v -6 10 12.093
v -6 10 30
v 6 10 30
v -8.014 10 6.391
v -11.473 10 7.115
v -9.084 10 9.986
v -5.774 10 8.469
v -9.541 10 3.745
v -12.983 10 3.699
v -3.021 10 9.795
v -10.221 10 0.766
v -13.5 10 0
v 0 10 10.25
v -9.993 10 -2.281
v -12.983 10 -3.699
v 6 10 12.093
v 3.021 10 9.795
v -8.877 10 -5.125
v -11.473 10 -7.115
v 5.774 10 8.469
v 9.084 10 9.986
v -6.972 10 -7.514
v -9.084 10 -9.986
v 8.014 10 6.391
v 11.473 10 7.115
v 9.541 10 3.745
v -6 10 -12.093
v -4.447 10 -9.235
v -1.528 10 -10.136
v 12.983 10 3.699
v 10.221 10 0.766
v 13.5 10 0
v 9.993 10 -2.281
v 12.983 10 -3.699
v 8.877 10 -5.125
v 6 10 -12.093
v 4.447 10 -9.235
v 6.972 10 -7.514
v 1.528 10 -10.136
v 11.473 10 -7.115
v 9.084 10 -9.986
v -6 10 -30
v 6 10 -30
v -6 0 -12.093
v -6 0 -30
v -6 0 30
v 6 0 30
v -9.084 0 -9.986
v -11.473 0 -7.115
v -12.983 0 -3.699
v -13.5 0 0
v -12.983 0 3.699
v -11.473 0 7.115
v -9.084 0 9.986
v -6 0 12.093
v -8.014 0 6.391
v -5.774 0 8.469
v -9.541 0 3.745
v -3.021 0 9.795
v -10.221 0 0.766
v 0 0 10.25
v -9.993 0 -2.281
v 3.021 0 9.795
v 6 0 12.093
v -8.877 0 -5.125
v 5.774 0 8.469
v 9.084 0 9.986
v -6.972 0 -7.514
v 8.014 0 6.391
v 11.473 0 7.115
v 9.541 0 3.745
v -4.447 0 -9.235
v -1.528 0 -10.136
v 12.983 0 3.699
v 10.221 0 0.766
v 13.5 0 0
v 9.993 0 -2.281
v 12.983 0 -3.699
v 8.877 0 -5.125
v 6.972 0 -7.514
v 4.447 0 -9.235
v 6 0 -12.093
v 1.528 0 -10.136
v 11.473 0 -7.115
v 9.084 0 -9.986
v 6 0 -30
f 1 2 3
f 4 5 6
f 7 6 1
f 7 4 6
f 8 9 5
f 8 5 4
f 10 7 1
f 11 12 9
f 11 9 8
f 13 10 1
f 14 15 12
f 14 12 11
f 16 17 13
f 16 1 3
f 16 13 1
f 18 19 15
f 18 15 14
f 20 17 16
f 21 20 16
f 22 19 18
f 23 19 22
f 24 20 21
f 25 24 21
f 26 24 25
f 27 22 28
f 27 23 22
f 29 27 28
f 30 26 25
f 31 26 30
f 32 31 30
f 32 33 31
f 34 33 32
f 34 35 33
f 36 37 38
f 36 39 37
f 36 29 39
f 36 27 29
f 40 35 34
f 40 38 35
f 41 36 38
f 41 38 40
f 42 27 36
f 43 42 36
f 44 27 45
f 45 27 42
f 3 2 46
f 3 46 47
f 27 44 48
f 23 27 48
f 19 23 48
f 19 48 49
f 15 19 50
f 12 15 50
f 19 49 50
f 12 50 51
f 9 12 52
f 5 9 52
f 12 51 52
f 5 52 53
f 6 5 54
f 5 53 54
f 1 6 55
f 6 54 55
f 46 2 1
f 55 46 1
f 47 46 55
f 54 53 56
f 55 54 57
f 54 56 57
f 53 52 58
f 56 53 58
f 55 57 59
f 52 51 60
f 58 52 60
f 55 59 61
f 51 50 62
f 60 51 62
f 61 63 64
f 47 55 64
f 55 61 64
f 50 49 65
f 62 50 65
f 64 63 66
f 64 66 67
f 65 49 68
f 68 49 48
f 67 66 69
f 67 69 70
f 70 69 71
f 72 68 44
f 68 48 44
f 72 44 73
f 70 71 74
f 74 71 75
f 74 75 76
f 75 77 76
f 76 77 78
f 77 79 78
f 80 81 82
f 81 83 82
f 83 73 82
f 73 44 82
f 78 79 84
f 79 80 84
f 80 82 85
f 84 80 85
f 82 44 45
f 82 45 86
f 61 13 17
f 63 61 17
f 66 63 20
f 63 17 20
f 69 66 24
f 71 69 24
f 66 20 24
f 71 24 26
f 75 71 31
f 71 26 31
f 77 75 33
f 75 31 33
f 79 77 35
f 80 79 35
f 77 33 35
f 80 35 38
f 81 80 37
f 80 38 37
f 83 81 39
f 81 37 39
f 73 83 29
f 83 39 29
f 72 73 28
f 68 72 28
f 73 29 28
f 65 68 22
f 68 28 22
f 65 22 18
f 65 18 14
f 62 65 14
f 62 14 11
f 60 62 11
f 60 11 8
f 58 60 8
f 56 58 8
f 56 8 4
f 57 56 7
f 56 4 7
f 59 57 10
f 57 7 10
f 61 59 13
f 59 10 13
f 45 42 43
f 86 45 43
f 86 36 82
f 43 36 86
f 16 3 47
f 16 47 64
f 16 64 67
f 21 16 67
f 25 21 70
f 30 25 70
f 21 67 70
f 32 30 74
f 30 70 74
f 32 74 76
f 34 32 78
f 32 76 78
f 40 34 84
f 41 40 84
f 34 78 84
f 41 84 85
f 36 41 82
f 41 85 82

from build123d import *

# Parameters (mm, degrees)
SKETCH_1_R          = 13.5
EXTRUDE_1_DEPTH     = 10
SKETCH_2_W          = 12
SKETCH_2_H          = 60
EXTRUDE_2_DEPTH     = 10
SKETCH_3_R          = 10.25
CUT_EXTRUDE_1_DEPTH = 10


with BuildPart() as part:
    # 草图1 → 凸台-拉伸1 (new body)
    with BuildSketch(Plane(origin=(0, 0, 0), x_dir=(1, 0, 0), z_dir=(0, 1, 0))):
        with Locations(Location((0, 0, 0), (0, 0, 270))):
            Circle(SKETCH_1_R)
    extrude(amount=EXTRUDE_1_DEPTH)

    # 草图2 → 凸台-拉伸2 (add)
    with BuildSketch(Plane(origin=(0, 10, 0), x_dir=(1, 0, 0), z_dir=(0, 1, 0))):
        Rectangle(SKETCH_2_W, SKETCH_2_H)
    extrude(amount=-EXTRUDE_2_DEPTH)

    # 草图3 → 切除-拉伸1 (cut)
    with BuildSketch(Plane(origin=(0, 10, 0), x_dir=(1, 0, 0), z_dir=(0, 1, 0))):
        with Locations(Location((0, 0, 0), (0, 0, 270))):
            Circle(SKETCH_3_R)
    extrude(amount=-CUT_EXTRUDE_1_DEPTH, mode=Mode.SUBTRACT)


solid = part.part
